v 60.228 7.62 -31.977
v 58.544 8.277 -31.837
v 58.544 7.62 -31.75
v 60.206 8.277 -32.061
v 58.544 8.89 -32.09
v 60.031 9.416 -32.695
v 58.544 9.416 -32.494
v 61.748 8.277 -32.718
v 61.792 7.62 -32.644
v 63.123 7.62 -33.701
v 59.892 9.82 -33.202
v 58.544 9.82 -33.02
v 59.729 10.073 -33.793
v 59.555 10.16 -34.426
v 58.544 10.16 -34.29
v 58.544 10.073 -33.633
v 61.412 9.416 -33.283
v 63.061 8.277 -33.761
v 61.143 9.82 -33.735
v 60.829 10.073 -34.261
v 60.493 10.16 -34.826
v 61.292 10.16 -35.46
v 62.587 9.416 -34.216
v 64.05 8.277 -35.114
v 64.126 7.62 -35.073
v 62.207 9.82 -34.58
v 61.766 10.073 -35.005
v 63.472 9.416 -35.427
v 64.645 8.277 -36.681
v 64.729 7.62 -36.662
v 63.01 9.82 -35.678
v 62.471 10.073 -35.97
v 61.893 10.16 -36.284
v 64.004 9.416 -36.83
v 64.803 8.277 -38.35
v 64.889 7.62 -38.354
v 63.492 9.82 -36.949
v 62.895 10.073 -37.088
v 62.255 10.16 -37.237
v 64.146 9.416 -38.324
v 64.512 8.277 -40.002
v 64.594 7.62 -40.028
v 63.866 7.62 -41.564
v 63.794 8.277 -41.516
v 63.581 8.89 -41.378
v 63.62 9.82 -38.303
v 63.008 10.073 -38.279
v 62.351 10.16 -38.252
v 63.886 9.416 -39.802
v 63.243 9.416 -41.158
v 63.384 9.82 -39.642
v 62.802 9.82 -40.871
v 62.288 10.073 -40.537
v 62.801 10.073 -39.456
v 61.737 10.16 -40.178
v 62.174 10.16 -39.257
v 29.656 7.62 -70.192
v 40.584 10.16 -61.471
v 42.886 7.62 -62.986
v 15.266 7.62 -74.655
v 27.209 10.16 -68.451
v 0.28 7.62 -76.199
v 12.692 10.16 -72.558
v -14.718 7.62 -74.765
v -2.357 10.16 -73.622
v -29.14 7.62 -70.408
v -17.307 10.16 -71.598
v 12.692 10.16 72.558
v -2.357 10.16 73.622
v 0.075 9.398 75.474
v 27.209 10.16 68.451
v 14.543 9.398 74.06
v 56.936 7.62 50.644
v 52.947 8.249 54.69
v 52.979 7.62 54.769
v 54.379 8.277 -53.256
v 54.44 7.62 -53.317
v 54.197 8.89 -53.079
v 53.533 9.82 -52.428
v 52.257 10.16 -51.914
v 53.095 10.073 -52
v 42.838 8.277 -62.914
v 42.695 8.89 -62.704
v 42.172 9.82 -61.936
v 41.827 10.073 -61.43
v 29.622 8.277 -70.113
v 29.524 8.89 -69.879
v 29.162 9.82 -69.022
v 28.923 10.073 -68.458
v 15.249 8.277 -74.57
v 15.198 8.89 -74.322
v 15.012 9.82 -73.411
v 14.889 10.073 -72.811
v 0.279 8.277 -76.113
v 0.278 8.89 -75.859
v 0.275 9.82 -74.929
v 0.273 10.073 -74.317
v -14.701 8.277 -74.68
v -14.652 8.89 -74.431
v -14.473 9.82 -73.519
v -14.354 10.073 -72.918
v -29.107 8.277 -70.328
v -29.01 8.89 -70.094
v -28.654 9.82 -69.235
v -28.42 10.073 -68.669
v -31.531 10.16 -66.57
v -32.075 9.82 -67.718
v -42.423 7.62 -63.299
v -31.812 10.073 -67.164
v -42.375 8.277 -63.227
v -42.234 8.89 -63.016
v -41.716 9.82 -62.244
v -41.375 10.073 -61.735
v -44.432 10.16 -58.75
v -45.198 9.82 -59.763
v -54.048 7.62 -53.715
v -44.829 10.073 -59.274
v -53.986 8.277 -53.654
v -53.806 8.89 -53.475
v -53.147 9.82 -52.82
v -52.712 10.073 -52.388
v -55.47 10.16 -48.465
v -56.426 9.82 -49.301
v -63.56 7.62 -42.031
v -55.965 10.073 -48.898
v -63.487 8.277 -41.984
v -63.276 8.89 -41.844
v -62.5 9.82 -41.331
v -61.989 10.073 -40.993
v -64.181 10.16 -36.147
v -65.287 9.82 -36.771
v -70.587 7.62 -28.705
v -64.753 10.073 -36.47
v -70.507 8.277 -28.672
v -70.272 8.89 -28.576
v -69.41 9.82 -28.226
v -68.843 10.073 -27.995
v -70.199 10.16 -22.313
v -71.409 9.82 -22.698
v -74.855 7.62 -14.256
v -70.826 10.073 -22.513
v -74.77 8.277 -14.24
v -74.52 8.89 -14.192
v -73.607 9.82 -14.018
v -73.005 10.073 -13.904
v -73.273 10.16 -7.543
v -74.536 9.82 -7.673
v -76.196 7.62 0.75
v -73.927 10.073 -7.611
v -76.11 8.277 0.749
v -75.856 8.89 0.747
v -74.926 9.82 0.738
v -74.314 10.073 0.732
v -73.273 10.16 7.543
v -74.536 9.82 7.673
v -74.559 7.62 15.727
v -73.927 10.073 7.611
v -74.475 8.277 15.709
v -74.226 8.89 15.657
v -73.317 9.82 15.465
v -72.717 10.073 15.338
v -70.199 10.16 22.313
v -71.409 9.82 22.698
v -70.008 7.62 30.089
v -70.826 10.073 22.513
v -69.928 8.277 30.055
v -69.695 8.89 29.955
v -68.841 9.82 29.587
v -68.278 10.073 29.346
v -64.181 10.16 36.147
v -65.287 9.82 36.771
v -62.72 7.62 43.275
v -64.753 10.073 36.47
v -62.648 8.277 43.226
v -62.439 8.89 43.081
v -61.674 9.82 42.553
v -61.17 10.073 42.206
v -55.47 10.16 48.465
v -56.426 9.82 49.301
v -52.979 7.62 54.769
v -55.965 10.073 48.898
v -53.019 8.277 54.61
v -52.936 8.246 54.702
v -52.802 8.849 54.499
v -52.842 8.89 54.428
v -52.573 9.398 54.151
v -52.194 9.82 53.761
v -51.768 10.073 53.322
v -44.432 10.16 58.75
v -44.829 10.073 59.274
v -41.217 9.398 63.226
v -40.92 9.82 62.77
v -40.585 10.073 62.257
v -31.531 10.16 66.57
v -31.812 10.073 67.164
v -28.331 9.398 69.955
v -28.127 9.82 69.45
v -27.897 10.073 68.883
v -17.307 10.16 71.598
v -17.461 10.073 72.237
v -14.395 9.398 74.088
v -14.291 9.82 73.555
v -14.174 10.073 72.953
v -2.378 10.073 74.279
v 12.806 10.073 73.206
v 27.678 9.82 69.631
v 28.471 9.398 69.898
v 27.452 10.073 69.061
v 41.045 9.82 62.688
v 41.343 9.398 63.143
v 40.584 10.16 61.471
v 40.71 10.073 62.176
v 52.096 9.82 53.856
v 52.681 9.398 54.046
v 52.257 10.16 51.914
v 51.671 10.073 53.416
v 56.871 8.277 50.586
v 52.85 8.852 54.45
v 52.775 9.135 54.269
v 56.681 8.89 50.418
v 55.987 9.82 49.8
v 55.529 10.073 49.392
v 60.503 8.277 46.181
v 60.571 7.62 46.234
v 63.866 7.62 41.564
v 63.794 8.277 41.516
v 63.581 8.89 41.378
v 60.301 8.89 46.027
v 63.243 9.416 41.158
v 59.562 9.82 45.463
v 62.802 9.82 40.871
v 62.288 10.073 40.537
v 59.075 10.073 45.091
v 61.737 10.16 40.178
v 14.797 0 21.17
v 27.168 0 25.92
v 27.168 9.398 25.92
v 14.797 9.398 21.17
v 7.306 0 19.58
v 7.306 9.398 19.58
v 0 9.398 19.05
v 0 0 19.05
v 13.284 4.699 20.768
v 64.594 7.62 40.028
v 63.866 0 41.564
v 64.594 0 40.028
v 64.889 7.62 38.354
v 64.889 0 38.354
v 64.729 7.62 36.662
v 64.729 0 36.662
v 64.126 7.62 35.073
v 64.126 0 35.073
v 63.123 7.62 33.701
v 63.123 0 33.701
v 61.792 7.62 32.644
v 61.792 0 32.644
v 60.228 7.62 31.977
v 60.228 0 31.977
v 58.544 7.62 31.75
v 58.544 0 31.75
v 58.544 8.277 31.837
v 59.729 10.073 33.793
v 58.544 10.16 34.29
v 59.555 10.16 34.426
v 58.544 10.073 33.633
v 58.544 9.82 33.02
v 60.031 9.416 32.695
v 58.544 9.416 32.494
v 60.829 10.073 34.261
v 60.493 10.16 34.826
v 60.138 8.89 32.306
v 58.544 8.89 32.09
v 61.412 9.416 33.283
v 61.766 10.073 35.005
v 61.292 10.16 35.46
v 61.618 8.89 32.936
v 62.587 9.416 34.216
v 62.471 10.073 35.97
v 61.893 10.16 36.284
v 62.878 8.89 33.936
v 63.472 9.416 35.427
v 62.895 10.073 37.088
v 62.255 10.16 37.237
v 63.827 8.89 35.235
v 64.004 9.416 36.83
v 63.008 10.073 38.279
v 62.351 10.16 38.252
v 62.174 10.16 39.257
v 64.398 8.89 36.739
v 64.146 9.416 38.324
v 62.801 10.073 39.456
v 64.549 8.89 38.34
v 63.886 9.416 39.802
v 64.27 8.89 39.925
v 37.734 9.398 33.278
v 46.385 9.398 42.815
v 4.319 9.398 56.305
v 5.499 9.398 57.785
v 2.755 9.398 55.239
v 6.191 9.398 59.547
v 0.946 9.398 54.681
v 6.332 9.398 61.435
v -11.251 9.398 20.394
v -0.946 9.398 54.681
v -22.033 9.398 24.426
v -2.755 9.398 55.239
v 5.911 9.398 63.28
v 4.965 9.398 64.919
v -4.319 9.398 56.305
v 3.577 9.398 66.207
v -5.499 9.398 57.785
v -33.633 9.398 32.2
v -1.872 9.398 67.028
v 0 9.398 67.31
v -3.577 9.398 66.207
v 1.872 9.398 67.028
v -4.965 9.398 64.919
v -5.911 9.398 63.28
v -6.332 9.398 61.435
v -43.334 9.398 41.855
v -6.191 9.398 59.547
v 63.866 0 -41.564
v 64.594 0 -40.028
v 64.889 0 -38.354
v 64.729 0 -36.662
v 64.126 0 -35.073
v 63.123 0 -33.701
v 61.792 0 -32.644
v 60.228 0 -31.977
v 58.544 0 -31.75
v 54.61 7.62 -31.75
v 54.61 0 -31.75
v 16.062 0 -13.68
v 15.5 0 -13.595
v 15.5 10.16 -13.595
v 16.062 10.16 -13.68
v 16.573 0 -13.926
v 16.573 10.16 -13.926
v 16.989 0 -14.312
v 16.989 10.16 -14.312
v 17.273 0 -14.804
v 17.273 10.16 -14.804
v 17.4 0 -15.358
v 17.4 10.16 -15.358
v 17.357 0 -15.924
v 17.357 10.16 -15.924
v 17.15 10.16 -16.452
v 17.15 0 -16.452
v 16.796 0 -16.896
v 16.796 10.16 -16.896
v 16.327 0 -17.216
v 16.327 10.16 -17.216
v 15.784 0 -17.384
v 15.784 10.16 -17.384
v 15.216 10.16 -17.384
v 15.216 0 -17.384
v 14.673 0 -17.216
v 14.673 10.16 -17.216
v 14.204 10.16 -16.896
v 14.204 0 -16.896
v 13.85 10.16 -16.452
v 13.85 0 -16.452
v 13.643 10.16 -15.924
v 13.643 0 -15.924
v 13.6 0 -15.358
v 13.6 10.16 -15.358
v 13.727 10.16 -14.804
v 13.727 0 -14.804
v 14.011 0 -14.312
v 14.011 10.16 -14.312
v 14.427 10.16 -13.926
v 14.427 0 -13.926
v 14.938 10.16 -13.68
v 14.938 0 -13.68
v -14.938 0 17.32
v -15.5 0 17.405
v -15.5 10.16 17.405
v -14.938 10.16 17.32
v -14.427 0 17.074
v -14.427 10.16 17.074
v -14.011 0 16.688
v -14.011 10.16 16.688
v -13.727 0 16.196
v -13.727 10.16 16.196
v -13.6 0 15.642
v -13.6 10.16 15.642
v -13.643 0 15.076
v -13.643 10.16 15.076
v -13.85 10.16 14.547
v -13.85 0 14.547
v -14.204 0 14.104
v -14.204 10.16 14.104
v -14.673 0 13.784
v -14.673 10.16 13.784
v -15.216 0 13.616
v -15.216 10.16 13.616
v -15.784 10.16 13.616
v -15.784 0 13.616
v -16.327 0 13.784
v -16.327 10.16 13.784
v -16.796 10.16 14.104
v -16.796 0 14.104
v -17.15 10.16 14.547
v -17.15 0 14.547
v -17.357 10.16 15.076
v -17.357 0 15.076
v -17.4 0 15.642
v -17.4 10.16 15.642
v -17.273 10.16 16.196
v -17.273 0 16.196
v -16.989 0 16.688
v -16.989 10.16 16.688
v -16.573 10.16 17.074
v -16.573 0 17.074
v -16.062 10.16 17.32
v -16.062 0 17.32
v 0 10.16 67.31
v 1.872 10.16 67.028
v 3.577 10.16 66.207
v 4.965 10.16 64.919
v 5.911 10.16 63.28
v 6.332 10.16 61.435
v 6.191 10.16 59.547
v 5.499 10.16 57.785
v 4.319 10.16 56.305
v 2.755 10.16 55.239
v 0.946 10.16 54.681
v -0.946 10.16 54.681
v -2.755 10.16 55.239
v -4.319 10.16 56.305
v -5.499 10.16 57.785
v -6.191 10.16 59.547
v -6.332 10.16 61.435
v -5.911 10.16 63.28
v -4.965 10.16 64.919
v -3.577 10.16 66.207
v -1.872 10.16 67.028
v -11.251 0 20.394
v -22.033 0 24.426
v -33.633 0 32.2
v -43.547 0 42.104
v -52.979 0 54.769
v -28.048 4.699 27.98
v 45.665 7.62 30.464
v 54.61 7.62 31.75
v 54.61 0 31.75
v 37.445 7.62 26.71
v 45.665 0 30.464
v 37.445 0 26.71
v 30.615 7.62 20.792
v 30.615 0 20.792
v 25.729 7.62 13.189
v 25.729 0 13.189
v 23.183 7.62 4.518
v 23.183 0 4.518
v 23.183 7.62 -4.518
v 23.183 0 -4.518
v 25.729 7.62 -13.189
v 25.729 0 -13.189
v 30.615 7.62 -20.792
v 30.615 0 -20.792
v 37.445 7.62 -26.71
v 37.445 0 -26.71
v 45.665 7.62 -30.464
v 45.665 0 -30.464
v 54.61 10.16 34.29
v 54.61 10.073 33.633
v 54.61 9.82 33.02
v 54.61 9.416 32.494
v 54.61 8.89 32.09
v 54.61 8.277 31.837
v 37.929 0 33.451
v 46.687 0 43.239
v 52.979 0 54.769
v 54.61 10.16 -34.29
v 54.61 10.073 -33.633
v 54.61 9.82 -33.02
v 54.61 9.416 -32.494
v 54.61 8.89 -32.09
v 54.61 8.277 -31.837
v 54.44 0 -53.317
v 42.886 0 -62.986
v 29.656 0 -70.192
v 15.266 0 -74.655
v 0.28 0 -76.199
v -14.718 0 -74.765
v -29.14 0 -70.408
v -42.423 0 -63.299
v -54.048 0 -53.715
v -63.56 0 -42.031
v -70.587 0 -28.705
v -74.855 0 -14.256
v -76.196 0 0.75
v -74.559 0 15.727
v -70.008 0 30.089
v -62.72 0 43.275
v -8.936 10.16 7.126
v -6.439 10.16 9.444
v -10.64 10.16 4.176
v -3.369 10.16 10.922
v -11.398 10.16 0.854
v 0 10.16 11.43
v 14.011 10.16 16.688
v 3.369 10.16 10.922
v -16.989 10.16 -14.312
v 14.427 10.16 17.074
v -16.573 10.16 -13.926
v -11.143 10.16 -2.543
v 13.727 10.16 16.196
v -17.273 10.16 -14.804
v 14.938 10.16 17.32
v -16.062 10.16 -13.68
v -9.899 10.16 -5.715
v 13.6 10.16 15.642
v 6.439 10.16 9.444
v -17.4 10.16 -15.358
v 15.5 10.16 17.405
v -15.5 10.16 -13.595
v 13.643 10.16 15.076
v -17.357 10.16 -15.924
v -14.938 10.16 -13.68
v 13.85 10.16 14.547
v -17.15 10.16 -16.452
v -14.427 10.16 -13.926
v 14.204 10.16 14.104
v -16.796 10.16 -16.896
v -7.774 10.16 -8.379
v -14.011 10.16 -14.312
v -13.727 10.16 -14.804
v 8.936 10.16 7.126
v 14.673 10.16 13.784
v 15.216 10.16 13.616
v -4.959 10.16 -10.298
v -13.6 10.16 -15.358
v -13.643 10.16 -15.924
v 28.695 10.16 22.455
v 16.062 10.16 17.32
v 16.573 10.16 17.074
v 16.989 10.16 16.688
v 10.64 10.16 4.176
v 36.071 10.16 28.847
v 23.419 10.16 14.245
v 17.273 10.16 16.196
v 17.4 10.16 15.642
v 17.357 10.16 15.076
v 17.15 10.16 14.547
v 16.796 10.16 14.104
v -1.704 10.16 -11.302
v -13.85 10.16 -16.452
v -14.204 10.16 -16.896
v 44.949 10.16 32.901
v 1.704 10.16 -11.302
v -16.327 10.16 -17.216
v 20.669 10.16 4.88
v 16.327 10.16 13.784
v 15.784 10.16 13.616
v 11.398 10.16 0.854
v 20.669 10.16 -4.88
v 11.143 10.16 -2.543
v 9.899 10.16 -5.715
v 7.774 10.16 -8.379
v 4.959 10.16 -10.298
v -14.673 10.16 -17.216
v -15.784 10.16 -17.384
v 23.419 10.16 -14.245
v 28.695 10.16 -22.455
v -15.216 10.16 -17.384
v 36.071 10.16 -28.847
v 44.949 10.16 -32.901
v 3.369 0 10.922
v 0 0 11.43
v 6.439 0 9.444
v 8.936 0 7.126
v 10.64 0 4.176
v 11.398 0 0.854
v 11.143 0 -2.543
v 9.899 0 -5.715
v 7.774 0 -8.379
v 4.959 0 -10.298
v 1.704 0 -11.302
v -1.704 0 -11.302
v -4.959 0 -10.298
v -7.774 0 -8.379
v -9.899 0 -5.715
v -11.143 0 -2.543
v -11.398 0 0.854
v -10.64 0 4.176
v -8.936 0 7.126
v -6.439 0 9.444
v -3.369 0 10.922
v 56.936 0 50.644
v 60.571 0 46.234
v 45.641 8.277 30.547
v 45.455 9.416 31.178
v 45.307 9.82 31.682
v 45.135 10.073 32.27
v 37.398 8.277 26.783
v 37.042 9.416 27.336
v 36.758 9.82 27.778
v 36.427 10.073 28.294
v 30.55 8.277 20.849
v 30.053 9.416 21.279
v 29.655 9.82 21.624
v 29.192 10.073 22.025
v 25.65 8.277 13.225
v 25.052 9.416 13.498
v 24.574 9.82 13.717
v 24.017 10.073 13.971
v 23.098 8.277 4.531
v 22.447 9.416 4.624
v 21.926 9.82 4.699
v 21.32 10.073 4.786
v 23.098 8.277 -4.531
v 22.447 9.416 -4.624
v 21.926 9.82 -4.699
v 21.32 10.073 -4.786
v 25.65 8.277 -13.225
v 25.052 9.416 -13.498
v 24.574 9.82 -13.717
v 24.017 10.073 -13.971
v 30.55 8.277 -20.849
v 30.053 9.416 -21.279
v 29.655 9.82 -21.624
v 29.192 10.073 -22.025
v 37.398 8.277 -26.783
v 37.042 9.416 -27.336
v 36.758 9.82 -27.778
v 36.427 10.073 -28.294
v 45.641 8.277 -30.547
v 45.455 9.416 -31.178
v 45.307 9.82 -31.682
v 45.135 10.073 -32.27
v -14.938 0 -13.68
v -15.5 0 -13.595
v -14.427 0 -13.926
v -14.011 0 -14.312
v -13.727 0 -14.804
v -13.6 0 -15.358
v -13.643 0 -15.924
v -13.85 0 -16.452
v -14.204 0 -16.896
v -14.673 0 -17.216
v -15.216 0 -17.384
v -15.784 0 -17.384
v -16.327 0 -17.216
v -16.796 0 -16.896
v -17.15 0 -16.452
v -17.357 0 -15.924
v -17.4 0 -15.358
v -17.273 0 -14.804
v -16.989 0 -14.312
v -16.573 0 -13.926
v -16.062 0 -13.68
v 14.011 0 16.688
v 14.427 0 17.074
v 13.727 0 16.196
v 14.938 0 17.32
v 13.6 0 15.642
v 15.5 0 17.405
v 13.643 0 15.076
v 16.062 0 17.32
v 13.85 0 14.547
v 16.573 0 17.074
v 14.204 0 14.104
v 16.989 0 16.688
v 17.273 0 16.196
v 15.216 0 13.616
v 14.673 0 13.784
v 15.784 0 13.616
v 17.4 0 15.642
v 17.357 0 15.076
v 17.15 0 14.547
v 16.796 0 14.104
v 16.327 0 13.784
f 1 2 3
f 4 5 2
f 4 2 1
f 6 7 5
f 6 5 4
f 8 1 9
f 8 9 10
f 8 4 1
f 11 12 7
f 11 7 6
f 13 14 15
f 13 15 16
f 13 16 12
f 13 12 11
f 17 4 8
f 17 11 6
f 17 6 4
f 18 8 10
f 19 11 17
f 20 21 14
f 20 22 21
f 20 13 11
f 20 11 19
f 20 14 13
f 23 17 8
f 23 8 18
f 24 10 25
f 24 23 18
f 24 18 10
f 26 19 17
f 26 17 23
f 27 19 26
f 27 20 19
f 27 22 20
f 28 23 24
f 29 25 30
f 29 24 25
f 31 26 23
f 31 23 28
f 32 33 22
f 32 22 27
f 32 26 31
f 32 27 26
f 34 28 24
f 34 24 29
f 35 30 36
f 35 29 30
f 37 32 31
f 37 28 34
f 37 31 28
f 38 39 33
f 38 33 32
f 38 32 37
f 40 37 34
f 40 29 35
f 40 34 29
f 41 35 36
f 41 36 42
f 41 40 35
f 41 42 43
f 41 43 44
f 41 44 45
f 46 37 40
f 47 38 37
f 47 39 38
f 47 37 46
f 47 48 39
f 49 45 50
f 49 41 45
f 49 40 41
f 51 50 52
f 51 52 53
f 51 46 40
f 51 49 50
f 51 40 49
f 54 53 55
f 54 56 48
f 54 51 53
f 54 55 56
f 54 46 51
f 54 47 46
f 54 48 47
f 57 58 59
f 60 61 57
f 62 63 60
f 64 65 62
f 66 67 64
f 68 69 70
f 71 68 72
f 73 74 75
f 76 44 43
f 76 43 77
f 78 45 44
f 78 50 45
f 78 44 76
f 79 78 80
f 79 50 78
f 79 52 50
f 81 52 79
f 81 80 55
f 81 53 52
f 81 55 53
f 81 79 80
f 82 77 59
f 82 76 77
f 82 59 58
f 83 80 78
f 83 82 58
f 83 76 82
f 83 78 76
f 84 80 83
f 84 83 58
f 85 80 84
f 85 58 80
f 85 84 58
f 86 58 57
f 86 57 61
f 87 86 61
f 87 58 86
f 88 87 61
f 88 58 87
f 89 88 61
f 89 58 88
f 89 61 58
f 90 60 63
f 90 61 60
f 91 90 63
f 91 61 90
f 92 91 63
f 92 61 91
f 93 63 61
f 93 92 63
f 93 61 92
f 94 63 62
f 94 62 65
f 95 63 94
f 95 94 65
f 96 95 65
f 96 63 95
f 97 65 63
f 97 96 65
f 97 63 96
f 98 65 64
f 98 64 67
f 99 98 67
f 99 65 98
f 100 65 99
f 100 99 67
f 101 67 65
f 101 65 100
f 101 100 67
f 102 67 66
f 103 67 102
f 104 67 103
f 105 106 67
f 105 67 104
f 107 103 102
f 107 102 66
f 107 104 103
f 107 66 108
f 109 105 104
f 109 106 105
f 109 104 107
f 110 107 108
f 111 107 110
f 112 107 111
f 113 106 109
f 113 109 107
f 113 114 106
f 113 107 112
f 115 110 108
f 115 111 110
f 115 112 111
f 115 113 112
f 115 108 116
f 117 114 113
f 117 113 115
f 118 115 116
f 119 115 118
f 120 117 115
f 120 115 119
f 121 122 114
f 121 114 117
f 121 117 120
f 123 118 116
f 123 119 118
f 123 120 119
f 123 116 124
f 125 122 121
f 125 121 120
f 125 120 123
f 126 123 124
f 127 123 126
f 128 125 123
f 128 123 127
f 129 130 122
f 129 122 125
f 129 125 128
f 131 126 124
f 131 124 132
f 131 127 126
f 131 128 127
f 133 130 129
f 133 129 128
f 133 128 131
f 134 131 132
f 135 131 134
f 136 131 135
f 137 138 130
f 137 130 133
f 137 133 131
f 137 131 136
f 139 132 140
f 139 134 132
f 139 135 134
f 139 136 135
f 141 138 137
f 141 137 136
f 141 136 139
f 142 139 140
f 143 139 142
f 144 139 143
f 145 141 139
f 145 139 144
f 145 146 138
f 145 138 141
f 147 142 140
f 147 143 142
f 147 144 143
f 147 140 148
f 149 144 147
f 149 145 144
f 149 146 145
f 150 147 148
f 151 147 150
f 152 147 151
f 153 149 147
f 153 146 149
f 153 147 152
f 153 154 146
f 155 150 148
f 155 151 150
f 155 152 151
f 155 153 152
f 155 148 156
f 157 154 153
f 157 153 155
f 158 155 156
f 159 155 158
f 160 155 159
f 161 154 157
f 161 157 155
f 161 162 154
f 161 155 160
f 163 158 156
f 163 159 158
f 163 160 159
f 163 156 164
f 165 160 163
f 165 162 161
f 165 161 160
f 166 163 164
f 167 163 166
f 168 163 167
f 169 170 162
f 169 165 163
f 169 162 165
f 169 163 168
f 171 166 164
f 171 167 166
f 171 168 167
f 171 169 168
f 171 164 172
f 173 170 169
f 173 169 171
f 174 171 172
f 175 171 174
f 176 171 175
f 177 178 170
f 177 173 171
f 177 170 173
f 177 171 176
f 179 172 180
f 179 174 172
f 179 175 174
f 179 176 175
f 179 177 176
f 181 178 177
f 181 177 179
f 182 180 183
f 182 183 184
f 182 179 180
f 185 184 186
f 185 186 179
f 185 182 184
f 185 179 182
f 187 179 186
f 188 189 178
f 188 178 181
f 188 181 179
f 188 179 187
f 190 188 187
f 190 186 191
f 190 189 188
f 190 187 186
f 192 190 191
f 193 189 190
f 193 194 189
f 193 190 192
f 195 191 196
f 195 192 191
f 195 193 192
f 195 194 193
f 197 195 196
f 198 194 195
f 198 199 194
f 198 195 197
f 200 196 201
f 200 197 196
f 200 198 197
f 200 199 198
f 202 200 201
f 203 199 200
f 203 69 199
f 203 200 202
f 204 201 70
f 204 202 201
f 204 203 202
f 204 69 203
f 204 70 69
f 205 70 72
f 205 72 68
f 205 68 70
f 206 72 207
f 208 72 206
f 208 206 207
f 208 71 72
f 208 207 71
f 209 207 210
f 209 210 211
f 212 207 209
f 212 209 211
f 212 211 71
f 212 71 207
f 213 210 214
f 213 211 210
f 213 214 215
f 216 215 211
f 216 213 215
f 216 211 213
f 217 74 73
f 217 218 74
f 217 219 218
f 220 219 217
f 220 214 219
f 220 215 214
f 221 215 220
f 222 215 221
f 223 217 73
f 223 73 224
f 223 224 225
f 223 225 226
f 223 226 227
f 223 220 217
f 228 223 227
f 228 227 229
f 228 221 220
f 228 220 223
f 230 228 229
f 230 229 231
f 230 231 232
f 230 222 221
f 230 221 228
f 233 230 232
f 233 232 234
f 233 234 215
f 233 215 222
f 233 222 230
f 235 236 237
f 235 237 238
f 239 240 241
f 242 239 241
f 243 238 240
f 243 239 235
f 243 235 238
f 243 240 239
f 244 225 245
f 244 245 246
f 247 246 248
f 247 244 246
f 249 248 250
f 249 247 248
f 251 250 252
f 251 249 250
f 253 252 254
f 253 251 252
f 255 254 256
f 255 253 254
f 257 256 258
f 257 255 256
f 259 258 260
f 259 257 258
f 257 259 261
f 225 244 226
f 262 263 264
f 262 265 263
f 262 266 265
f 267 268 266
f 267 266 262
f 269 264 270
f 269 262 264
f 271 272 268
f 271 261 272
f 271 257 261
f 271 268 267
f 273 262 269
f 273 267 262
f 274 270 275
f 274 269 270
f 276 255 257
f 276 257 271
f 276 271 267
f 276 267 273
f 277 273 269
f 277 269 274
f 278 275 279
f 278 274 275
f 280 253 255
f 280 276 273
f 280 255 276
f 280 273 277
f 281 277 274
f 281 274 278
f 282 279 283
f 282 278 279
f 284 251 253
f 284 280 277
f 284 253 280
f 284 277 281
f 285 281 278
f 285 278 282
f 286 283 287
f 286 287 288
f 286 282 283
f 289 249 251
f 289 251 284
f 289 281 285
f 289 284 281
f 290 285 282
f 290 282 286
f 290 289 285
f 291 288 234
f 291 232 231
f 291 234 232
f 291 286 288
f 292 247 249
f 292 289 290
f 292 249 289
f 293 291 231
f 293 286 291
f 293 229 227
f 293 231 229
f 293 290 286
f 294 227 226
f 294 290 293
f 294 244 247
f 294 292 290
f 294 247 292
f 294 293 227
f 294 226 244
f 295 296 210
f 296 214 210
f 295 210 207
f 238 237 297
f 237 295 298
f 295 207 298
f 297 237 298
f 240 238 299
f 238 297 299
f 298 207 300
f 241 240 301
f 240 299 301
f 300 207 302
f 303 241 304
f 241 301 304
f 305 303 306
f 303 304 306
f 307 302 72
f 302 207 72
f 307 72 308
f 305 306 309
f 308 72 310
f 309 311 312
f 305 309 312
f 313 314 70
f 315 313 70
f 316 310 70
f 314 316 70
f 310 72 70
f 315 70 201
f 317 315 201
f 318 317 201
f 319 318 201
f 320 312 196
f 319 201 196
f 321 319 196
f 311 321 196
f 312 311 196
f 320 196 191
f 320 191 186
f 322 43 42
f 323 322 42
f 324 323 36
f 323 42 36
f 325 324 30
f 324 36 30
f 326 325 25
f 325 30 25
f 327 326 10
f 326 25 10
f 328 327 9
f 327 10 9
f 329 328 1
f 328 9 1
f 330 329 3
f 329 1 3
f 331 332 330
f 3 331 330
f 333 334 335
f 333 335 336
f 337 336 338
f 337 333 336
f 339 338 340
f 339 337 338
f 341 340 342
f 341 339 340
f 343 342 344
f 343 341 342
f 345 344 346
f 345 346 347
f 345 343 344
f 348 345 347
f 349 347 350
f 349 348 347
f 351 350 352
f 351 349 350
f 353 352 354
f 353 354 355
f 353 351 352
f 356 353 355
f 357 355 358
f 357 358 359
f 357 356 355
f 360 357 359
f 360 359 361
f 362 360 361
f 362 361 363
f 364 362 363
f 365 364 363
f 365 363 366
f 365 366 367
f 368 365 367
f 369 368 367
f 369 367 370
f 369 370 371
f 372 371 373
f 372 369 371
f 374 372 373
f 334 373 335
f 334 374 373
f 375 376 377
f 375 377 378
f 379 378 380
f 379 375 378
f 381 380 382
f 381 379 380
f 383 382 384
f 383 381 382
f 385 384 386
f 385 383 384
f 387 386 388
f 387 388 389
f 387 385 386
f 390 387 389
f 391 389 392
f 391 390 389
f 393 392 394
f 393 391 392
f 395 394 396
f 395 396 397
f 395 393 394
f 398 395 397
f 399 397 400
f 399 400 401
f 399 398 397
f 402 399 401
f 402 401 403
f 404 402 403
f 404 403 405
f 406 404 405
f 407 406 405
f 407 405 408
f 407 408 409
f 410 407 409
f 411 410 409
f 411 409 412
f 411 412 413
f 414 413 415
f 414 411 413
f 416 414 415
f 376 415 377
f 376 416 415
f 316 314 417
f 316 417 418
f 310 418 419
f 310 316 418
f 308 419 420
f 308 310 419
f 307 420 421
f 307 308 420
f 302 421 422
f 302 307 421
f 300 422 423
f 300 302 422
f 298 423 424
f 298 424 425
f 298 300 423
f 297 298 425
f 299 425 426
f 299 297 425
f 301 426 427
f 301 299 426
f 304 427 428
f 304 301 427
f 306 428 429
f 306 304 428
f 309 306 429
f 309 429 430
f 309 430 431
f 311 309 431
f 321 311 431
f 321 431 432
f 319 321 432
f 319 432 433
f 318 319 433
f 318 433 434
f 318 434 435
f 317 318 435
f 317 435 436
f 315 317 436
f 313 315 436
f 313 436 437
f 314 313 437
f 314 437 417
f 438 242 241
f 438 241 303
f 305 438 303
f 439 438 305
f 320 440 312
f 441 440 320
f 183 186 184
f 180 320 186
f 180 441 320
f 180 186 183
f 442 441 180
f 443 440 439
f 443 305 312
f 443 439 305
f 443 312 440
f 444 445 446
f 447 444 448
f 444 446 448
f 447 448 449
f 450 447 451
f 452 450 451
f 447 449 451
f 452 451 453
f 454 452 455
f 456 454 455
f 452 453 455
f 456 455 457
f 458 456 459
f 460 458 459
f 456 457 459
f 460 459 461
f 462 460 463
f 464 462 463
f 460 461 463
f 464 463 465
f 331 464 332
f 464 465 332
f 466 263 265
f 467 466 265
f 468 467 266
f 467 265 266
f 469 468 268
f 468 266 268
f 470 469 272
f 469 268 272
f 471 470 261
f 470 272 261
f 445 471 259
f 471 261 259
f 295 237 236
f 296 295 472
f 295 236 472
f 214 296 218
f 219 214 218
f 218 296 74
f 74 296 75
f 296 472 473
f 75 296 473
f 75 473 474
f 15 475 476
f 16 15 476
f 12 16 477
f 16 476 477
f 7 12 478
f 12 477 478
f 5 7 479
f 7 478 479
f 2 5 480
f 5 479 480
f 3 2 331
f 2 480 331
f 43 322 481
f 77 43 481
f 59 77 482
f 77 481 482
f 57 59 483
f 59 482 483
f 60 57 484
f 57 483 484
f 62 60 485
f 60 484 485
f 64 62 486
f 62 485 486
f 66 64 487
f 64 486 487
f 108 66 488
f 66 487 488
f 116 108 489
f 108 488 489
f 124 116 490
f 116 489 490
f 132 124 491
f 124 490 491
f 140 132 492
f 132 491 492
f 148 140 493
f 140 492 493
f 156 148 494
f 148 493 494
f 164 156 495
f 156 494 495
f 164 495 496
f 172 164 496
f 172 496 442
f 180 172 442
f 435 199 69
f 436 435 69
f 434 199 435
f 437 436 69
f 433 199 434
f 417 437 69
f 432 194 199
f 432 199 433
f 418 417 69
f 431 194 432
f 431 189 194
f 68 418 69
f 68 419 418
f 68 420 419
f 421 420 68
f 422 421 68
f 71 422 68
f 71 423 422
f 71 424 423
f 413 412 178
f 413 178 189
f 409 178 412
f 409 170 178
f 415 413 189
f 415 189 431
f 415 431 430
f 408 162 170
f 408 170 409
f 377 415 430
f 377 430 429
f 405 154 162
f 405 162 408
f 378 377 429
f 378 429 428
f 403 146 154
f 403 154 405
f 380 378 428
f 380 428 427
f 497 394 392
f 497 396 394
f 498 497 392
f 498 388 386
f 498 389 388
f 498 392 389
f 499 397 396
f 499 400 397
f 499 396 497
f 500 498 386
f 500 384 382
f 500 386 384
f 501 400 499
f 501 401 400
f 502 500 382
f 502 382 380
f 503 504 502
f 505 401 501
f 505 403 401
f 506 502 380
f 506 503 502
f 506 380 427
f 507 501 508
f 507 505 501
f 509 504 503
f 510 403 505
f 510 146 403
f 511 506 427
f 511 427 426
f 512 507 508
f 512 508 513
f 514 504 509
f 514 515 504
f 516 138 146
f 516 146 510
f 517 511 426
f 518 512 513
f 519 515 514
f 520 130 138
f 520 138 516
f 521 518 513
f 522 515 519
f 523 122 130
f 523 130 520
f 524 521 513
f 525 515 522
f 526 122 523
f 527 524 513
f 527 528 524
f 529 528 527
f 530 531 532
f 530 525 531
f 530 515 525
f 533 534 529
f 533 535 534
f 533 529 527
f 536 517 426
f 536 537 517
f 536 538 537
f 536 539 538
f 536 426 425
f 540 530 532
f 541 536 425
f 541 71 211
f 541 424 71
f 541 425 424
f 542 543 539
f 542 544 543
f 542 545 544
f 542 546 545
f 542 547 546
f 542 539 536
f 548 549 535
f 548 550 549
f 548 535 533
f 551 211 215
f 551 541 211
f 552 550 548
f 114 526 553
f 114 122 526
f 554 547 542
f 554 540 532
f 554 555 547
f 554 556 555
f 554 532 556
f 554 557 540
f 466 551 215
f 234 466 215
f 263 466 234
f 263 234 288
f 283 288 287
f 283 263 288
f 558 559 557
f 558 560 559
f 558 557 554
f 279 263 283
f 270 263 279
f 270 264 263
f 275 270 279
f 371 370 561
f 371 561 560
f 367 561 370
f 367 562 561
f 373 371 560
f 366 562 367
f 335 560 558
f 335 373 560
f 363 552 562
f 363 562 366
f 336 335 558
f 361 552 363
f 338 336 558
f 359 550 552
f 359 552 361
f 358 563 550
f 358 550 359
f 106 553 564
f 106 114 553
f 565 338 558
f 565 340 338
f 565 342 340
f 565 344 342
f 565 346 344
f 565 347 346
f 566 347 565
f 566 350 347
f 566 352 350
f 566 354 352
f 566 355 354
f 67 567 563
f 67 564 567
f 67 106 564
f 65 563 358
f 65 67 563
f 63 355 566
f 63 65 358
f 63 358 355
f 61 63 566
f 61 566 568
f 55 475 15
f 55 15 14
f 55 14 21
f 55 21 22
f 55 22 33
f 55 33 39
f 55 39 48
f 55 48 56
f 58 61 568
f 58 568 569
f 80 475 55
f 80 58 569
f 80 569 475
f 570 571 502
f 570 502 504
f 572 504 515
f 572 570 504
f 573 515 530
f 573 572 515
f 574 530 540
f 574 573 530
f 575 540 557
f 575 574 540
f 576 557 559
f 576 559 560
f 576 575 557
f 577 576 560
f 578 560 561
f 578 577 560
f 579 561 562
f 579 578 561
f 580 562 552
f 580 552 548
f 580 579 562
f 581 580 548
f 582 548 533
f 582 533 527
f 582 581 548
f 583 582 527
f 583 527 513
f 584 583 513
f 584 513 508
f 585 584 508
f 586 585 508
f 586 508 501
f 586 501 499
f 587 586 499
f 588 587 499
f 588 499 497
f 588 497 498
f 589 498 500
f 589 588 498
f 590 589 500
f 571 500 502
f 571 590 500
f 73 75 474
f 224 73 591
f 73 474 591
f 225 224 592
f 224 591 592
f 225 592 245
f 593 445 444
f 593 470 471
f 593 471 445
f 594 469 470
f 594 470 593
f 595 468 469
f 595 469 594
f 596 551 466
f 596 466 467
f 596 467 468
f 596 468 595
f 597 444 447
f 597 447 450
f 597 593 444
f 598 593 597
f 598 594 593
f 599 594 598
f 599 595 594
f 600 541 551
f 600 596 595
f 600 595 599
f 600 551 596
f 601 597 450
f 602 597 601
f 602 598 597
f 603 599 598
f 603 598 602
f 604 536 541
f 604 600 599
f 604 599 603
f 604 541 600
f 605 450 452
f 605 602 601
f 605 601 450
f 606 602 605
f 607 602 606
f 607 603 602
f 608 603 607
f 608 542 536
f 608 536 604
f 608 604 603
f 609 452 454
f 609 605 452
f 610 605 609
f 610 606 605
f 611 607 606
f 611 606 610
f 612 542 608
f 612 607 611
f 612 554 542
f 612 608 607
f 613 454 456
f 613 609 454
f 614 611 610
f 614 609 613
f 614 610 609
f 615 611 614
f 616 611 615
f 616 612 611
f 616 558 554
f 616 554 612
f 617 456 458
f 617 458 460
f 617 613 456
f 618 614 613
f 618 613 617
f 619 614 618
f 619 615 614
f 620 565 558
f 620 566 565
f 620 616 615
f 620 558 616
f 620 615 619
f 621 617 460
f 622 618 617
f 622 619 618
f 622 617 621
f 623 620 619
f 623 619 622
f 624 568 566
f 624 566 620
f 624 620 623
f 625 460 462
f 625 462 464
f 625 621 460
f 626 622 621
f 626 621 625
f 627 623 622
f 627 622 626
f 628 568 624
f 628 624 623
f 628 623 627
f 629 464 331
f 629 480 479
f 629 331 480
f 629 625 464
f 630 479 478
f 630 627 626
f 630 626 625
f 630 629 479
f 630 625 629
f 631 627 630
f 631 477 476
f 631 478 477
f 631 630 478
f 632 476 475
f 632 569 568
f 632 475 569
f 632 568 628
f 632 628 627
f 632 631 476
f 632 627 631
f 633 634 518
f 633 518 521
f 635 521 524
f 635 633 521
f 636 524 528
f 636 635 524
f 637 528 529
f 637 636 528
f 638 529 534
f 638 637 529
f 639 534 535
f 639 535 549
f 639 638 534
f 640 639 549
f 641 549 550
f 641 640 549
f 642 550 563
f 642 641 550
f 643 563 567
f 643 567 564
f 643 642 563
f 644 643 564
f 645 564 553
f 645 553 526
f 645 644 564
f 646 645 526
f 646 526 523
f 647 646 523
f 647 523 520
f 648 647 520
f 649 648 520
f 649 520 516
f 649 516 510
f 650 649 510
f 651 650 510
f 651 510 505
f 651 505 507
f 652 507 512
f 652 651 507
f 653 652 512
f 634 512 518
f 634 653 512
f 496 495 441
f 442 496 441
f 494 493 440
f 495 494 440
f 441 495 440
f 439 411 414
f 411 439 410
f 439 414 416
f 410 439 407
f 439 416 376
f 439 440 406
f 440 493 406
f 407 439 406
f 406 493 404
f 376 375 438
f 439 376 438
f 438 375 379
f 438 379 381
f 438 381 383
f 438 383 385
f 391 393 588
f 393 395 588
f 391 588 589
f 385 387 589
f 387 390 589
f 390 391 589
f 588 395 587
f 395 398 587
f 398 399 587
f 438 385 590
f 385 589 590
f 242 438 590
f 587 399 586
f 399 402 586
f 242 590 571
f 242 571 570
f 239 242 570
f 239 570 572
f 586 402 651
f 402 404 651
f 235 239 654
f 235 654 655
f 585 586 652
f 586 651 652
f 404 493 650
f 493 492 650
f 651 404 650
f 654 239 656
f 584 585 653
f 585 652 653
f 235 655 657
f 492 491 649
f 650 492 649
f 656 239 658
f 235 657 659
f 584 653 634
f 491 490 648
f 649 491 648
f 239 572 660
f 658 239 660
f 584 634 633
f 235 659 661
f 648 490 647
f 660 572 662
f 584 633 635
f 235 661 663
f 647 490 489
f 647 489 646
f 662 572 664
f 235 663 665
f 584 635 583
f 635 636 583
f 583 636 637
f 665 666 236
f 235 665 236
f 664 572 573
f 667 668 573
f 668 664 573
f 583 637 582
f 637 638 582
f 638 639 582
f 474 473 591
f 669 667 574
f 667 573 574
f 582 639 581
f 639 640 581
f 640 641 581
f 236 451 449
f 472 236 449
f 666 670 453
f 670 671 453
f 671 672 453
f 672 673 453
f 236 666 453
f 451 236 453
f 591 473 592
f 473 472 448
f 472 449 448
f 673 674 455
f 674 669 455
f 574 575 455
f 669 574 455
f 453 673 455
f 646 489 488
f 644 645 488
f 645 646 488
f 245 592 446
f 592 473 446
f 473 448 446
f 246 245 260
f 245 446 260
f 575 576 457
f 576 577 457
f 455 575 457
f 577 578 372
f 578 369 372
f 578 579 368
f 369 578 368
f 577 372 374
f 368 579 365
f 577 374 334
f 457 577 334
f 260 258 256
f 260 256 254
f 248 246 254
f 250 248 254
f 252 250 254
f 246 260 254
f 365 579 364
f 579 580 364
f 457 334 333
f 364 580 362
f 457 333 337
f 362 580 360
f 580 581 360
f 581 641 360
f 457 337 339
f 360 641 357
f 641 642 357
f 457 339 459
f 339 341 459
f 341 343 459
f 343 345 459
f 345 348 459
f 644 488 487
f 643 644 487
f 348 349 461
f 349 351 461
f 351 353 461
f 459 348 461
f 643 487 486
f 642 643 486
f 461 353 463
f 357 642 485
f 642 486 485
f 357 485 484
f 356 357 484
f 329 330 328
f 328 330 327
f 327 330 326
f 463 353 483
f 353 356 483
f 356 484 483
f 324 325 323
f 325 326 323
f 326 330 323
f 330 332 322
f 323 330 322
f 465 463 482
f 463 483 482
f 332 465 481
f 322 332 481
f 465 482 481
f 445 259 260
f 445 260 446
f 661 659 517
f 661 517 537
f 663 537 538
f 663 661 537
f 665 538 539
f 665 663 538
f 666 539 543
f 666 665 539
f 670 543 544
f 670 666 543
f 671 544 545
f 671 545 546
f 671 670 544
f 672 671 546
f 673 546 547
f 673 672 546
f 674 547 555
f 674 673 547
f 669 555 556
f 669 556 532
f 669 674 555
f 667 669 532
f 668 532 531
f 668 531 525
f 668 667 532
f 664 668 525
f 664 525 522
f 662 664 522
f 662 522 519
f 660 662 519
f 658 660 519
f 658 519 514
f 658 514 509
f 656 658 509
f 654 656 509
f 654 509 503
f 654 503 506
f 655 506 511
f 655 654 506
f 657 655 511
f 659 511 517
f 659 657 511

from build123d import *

# Parameters (mm, degrees)
SKETCH1_R           = 6.35
SKETCH1_R_2         = 1.905
SKETCH1_R_3         = 11.43
BOSS_EXTRUDE1_DEPTH = 10.16
SKETCH8_R           = 6.35
CUT_EXTRUDE3_DEPTH  = 9.398
FILLET1_R           = 6.35
FILLET3_R           = 2.54


with BuildPart() as part:
    # Sketch1 → Boss-Extrude1 (new body)
    with BuildSketch(Plane(origin=(0, 0, 0), x_dir=(1, 0, 0), z_dir=(0, 1, 0))):
        with BuildLine():
            ThreePointArc((54.61, -31.75), (22.86, 0), (54.61, 31.75))
            Line((54.61, 31.75), (69.270321928, 31.75))
            ThreePointArc((69.270321928, 31.75), (-76.2, 0), (69.270321928, -31.75))
            Line((69.270321928, -31.75), (54.61, -31.75))
        make_face()
        with Locations(Location((0, -60.96, 0), (0, 0, 270))):
            Circle(SKETCH1_R, mode=Mode.SUBTRACT)
        with Locations(Location((-15.499999988, -15.499999988, 0), (0, 0, 270))):
            Circle(SKETCH1_R_2, mode=Mode.SUBTRACT)
        with Locations(Location((15.499999988, -15.499999988, 0), (0, 0, 270))):
            Circle(SKETCH1_R_2, mode=Mode.SUBTRACT)
        with Locations(Location((-15.499999988, 15.499999988, 0), (0, 0, 270))):
            Circle(SKETCH1_R_2, mode=Mode.SUBTRACT)
        with Locations(Location((0, 0, 0), (0, 0, 270))):
            Circle(SKETCH1_R_3, mode=Mode.SUBTRACT)
        with Locations(Location((15.499999988, 15.499999988, 0), (0, 0, 270))):
            Circle(SKETCH1_R_2, mode=Mode.SUBTRACT)
    extrude(amount=BOSS_EXTRUDE1_DEPTH)

    # Sketch8 → Cut-Extrude3 (cut)
    with BuildSketch(Plane.XZ):
        with BuildLine():
            add(Edge.make_bspline(
                [(27.167528595, 25.920303401), (12.984356547, 19.050000027), (1.04e-07, 19.05)],
                knots=[0, 0, 0, 0.304865692, 0.304865692, 0.304865692], degree=2))
            ThreePointArc((27.167528595, 25.920303401), (42.590415369, 38.092533294), (52.979467942, 54.76875))
            ThreePointArc((52.979467942, 54.76875), (0, 76.2), (-52.979467942, 54.76875))
            add(Edge.make_bspline(
                [(1.04e-07, 19.05), (-29.606058837, 19.049999938), (-52.979467942, 54.76875)],
                knots=[0.304865692, 0.304865692, 0.304865692, 1, 1, 1], degree=2))
        make_face()
        with Locations(Location((0, 60.96, 0), (0, 0, 270))):
            Circle(SKETCH8_R, mode=Mode.SUBTRACT)
    extrude(amount=-CUT_EXTRUDE3_DEPTH, mode=Mode.SUBTRACT)

    # Fillet1
    fillet1_edges = [part.edges().sort_by_distance(p)[0] for p in [
        (69.270321928, 5.08, -31.75),
        (69.270321928, 5.08, 31.75),
    ]]
    fillet(fillet1_edges, radius=FILLET1_R)

    # Fillet3
    # the kernel refuses this fillet: 2.54 mm, written as the material it takes off along each edge
    with BuildSketch(Plane(origin=(54.61, 10.16, -31.75), x_dir=(0, 0, -1), z_dir=(1, 0, 0))) as fillet3_piece_1:
        with BuildLine():
            CenterArc((FILLET3_R, -FILLET3_R), FILLET3_R, 90, 90)
            Line((0, -FILLET3_R), (0, 0))
            Line((0, 0), (FILLET3_R, 0))
        make_face()
    extrude(amount=3.934107304, mode=Mode.SUBTRACT)
    with BuildSketch(Plane(origin=(58.544107304, 10.16, -38.1), x_dir=(0, 0, 1), z_dir=(-1, 0, 0))) as fillet3_piece_2:
        with BuildLine():
            CenterArc((6.35 - FILLET3_R, -FILLET3_R), FILLET3_R, 0, 90)
            Line((6.35, -FILLET3_R), (6.35, 0))
            Line((6.35, 0), (6.35 - FILLET3_R, 0))
        make_face()
    revolve(axis=Axis((58.544107304, 10.16, -38.1), (0, 1, 0)), revolution_arc=123.055731151, mode=Mode.SUBTRACT)
    with BuildSketch(Plane(origin=(0, 10.16, 0), x_dir=(0.8381404052084442, 0, -0.5454545454545454), z_dir=(0.5454545454545454, 0, 0.8381404052084442))) as fillet3_piece_3:
        with BuildLine():
            CenterArc((76.2 - FILLET3_R, -FILLET3_R), FILLET3_R, 0, 90)
            Line((76.2, -FILLET3_R), (76.2, 0))
            Line((76.2, 0), (76.2 - FILLET3_R, 0))
        make_face()
    revolve(axis=Axis((0, 10.16, 0), (0, 1, 0)), revolution_arc=293.888537698, mode=Mode.SUBTRACT)
    with BuildSketch(Plane(origin=(58.544107304, 10.16, 38.1), x_dir=(0, 0, -1), z_dir=(-1, 0, 0))) as fillet3_piece_4:
        with BuildLine():
            CenterArc((6.35 - FILLET3_R, FILLET3_R), FILLET3_R, 270, 90)
            Line((6.35 - FILLET3_R, 0), (6.35, 0))
            Line((6.35, 0), (6.35, FILLET3_R))
        make_face()
    revolve(axis=Axis((58.544107304, 10.16, 38.1), (0, -1, 0)), revolution_arc=123.055731151, mode=Mode.SUBTRACT)
    with BuildSketch(Plane(origin=(58.544107304, 10.16, 31.75), x_dir=(0, -1, 0), z_dir=(-1, 0, 0))) as fillet3_piece_5:
        with BuildLine():
            CenterArc((FILLET3_R, FILLET3_R), FILLET3_R, 180, 90)
            Line((0, FILLET3_R), (0, 0))
            Line((0, 0), (FILLET3_R, 0))
        make_face()
    extrude(amount=3.934107304, mode=Mode.SUBTRACT)
    with BuildSketch(Plane(origin=(54.61, 10.16, 0), x_dir=(0, 0, 1), z_dir=(1, 0, 0))) as fillet3_piece_6:
        with BuildLine():
            CenterArc((31.75 + FILLET3_R, FILLET3_R), FILLET3_R, 180, 90)
            Line((31.75 + FILLET3_R, 0), (31.75, 0))
            Line((31.75, 0), (31.75, FILLET3_R))
        make_face()
    revolve(axis=Axis((54.61, 10.16, 0), (0, -1, 0)), revolution_arc=180, mode=Mode.SUBTRACT)


solid = part.part
